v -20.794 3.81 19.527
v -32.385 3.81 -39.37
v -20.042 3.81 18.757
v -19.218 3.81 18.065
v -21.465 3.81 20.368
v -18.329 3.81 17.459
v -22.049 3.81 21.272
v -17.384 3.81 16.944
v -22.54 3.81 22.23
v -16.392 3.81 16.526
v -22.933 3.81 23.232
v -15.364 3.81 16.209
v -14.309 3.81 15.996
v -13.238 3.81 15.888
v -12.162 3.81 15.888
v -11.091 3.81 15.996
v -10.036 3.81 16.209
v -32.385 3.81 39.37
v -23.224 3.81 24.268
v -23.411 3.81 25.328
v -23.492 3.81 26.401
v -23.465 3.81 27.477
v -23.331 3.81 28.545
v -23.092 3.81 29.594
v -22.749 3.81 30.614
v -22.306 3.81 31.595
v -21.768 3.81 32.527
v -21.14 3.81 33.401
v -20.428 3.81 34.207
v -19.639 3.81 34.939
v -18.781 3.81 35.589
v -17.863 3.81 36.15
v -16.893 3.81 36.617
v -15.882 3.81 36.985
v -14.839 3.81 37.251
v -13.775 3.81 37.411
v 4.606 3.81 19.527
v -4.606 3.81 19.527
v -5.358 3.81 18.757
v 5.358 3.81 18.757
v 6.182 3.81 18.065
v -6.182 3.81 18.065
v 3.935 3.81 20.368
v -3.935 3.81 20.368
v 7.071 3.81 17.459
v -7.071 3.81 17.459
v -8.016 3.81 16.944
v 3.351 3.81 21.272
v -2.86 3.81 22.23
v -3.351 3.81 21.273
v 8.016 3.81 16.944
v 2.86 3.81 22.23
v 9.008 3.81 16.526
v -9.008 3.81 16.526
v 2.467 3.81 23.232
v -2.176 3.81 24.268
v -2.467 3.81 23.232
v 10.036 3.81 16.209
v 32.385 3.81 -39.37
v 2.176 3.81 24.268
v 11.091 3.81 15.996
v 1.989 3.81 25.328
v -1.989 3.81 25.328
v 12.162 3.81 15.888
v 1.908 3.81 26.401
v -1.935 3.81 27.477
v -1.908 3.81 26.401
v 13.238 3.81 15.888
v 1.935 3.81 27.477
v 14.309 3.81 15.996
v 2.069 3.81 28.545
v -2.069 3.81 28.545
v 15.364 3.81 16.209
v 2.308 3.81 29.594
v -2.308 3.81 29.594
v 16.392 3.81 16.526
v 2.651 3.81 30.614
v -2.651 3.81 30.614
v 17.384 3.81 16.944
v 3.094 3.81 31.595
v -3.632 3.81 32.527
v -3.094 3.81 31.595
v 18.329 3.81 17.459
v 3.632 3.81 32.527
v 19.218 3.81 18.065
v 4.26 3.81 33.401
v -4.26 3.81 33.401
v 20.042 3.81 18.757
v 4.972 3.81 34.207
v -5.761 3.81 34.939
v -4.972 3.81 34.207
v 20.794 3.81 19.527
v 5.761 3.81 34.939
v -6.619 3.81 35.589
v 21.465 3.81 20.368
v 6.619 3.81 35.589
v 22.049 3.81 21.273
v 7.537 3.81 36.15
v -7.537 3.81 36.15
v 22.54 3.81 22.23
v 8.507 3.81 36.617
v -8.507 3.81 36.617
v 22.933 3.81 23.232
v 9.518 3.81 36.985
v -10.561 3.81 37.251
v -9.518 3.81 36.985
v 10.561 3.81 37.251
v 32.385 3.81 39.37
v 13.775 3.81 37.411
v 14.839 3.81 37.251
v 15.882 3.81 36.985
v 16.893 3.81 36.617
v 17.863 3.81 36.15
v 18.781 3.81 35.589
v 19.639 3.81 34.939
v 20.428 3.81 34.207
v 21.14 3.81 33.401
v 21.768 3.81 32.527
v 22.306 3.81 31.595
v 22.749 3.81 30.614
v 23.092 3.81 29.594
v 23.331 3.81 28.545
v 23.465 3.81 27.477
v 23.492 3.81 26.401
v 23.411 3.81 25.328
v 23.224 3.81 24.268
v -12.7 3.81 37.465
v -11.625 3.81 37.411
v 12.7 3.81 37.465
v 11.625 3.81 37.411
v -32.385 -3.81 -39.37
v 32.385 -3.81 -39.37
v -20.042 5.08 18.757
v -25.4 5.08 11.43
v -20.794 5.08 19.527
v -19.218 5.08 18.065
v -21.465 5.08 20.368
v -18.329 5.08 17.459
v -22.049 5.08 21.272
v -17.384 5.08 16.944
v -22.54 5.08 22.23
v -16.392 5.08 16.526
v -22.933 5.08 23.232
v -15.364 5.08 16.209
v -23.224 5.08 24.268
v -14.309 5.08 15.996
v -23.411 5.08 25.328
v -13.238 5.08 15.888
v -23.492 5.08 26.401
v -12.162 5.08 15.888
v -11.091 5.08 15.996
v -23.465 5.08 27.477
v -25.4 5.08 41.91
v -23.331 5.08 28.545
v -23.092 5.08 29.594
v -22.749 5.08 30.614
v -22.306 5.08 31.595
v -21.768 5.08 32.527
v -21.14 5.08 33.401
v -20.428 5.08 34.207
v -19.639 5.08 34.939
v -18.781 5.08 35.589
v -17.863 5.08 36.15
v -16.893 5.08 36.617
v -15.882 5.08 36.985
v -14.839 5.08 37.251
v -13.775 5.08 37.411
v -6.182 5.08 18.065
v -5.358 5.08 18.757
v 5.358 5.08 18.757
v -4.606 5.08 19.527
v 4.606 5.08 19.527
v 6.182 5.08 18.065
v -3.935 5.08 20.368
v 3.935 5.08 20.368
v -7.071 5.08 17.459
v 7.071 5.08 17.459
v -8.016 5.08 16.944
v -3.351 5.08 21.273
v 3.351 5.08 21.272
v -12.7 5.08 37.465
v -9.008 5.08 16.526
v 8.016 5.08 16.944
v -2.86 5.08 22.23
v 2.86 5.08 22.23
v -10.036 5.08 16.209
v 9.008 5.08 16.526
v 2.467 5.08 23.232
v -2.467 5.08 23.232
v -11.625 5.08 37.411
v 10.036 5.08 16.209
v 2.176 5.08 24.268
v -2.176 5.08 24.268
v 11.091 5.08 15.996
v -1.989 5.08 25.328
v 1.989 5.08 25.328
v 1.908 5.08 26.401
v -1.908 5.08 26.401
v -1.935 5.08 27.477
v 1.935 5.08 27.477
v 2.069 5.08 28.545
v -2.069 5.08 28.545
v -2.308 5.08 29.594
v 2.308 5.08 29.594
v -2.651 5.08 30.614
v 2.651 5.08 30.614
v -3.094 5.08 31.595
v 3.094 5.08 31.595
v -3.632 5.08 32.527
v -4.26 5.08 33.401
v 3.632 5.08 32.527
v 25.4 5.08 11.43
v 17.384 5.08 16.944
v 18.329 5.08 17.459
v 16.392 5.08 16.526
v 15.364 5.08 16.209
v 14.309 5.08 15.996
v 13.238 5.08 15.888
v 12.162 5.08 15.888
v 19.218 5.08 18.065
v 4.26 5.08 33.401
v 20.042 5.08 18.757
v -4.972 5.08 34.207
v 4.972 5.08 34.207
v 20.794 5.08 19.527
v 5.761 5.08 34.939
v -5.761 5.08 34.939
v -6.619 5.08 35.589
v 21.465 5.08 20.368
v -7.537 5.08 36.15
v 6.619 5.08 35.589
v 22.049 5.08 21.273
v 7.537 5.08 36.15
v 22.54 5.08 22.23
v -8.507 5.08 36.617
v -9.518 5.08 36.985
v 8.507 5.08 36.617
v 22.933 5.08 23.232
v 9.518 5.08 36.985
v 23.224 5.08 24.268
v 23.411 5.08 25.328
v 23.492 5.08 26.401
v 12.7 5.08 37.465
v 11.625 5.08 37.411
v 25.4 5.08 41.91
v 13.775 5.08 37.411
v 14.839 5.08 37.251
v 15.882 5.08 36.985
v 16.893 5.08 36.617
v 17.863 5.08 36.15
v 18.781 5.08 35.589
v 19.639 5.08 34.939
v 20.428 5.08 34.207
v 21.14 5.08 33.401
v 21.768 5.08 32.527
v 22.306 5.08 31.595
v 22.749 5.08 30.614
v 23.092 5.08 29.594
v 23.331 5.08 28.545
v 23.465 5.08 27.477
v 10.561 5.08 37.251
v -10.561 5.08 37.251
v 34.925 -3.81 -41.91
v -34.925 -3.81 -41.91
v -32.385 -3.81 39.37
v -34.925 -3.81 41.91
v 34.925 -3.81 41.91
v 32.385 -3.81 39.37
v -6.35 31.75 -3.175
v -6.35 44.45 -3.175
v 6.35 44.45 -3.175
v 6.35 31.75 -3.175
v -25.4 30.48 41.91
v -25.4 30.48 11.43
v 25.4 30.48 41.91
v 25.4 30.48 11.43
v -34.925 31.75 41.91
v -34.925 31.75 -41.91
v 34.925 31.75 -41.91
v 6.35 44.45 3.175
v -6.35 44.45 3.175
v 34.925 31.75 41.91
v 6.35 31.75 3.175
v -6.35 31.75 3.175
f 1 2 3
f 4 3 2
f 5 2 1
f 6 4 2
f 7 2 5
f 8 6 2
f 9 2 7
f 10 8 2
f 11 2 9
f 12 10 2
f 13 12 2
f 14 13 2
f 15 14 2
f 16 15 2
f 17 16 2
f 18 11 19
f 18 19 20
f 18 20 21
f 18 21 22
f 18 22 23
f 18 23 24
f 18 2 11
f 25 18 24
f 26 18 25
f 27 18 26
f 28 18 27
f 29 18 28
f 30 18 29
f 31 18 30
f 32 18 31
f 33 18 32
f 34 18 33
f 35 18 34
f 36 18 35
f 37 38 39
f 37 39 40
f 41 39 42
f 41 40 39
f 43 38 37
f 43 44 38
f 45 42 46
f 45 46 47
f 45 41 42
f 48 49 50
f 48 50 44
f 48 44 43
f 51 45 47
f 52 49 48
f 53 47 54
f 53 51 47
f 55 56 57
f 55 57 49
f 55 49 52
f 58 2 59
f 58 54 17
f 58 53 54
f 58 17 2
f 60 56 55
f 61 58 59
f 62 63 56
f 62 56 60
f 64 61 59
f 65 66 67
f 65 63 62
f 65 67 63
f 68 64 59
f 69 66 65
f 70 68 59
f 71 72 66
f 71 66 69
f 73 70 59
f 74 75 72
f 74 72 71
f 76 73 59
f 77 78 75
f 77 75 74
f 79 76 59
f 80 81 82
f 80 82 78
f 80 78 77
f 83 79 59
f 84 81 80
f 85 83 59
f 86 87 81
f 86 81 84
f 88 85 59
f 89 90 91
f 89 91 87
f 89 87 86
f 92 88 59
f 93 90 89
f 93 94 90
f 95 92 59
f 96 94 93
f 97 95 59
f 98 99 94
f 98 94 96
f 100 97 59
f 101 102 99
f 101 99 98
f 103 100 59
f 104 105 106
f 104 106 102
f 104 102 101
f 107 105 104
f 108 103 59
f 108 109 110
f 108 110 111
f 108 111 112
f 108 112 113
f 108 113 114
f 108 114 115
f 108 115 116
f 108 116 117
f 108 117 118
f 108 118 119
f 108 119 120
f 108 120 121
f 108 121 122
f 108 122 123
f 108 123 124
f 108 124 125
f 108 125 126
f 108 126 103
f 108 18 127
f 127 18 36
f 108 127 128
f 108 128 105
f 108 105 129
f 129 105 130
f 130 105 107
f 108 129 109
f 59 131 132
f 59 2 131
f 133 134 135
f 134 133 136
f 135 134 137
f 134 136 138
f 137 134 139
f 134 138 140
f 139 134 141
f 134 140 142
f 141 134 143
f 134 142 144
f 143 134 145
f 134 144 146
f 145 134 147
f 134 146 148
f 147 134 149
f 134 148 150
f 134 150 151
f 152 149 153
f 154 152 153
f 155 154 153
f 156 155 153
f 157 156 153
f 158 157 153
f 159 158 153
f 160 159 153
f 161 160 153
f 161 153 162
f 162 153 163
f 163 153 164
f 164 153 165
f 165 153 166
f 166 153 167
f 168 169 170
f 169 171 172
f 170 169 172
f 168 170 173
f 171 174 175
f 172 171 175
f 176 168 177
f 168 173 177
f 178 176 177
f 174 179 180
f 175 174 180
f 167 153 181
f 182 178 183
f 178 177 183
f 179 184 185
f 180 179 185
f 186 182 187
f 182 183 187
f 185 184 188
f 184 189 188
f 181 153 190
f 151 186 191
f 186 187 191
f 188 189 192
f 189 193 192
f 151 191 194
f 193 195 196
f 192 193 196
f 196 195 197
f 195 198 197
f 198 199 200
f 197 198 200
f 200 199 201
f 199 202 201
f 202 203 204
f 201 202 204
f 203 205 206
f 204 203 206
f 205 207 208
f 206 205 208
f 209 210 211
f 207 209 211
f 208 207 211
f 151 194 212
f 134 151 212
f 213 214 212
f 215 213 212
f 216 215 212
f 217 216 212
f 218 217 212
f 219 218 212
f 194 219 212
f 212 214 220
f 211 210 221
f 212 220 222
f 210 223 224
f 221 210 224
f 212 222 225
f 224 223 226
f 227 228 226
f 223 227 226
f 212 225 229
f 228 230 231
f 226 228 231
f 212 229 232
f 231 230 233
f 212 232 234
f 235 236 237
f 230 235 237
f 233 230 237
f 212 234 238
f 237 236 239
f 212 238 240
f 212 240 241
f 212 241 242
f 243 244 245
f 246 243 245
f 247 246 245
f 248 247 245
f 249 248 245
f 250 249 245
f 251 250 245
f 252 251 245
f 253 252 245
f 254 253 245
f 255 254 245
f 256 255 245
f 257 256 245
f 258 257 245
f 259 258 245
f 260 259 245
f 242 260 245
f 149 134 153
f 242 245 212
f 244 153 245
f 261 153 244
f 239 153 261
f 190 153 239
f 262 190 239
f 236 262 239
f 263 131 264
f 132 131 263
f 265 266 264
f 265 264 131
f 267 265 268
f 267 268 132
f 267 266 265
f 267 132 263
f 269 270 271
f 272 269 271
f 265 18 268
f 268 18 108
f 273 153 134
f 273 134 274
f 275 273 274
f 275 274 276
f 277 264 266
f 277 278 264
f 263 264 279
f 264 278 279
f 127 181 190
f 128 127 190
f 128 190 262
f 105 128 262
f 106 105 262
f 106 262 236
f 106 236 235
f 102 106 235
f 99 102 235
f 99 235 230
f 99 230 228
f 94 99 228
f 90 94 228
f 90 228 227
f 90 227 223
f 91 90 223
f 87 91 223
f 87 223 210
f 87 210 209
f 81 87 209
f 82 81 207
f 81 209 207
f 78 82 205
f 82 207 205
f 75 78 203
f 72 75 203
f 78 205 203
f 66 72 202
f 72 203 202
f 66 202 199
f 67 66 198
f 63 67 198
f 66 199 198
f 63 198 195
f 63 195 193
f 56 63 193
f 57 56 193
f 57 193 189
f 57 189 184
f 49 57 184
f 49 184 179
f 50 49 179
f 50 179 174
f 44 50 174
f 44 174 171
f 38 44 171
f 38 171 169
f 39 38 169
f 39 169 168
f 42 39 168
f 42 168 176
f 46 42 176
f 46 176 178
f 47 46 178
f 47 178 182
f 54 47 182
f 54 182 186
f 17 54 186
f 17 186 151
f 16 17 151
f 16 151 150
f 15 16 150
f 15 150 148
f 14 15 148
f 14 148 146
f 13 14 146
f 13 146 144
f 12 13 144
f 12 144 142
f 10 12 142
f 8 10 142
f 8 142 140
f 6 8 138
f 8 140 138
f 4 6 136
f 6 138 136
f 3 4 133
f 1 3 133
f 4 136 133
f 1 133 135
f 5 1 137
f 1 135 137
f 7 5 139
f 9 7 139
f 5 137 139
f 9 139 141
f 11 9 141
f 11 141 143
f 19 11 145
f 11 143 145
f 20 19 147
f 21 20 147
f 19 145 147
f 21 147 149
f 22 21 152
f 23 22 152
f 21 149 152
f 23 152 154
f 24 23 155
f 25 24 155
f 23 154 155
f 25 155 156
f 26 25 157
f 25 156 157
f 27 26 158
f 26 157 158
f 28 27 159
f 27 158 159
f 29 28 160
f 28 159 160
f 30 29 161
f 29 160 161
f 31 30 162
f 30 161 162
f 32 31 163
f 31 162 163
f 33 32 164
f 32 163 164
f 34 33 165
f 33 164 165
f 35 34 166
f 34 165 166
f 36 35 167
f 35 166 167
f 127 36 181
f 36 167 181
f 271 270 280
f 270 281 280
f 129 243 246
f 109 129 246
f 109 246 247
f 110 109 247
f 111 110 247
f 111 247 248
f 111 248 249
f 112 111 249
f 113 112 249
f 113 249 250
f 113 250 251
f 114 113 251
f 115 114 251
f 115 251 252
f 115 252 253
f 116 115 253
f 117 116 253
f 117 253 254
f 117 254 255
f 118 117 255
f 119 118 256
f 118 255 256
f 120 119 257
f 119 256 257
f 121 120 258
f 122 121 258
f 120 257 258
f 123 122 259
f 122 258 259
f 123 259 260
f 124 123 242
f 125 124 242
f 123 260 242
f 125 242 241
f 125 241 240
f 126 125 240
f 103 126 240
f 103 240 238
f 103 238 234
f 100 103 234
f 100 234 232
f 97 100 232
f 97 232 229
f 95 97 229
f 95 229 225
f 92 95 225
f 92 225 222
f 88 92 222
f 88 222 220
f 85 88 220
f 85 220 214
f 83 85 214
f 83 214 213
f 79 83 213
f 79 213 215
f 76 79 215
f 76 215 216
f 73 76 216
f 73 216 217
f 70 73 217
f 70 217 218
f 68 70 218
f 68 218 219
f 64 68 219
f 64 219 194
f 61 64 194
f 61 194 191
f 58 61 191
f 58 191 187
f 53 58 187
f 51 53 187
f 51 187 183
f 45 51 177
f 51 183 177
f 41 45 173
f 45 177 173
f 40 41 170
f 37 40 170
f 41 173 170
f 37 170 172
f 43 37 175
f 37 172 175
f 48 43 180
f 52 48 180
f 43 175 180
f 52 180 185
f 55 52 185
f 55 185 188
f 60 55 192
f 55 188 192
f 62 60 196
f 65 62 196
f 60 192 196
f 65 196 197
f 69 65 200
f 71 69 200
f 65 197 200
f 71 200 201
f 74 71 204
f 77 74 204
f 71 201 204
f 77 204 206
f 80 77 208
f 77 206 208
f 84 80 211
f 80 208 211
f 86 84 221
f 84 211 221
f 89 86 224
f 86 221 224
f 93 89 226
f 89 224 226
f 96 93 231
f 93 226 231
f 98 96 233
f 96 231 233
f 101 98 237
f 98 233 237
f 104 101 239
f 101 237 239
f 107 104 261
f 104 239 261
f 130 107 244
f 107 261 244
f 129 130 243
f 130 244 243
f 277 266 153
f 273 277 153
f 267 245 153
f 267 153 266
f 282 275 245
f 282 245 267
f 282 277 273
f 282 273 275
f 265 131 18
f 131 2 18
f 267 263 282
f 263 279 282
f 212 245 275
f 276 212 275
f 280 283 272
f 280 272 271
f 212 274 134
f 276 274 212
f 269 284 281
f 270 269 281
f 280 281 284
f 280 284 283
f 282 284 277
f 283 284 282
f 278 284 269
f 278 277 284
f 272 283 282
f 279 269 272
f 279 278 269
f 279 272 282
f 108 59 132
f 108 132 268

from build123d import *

# Parameters (mm, degrees)
SKETCH1_W           = 69.85
SKETCH1_H           = 6.35
BOSS_EXTRUDE1_DEPTH = 41.91
SHELL1_T            = -2.54
SKETCH2_W           = 69.85
SKETCH2_H           = 83.82
BOSS_EXTRUDE2_DEPTH = 25.4
SKETCH5_W           = 12.7
SKETCH5_H           = 12.7
BOSS_EXTRUDE5_DEPTH = 3.175
SKETCH6_W           = 50.8
SKETCH6_H           = 25.4
CUT_EXTRUDE1_DEPTH  = 30.48
CUT_EXTRUDE2_REACH  = 69.277
SKETCH7_R           = 10.795
SKETCH8_W           = 69.85
SKETCH8_H           = 83.82
SKETCH8_W_2         = 64.77
SKETCH8_H_2         = 78.74
BOSS_EXTRUDE6_DEPTH = 3.81


with BuildPart() as part:
    # Sketch1 → Boss-Extrude1 (new, symmetric)
    with BuildSketch(Plane.XY):
        with Locations((0, 3.175)):
            Rectangle(SKETCH1_W, SKETCH1_H)
    extrude(amount=BOSS_EXTRUDE1_DEPTH, both=True)

    # Shell1
    shell1_openings = [part.faces().sort_by_distance(p)[0] for p in [
        (0, 0, 0),
    ]]
    offset(amount=SHELL1_T, openings=shell1_openings, kind=Kind.INTERSECTION)

    # Sketch2 → Boss-Extrude2 (add)
    with BuildSketch(Plane(origin=(0, 6.35, 0), x_dir=(1, 0, 0), z_dir=(0, 1, 0))):
        Rectangle(SKETCH2_W, SKETCH2_H)
    extrude(amount=BOSS_EXTRUDE2_DEPTH)

    # Sketch5 → Boss-Extrude5 (add, symmetric)
    with BuildSketch(Plane.XY):
        with Locations((0, 38.1)):
            Rectangle(SKETCH5_W, SKETCH5_H)
    extrude(amount=BOSS_EXTRUDE5_DEPTH, both=True)

    # Sketch6 → Cut-Extrude1 (cut)
    with BuildSketch(Plane.XY.offset(41.91)):
        with Locations((0, 17.78)):
            Rectangle(SKETCH6_W, SKETCH6_H)
    extrude(amount=-CUT_EXTRUDE1_DEPTH, mode=Mode.SUBTRACT)

    # Sketch7 → Cut-Extrude2 (cut, up to next)
    with BuildSketch(Plane(origin=(0, 5.08, 0), x_dir=(1, 0, 0), z_dir=(0, 1, 0)), mode=Mode.PRIVATE) as cut_extrude2_sk1:
        with Locations(Location((-12.7, -26.67, 0), (0, 0, 270))):
            Circle(SKETCH7_R)
    cut_extrude2_tool1 = extrude(cut_extrude2_sk1.sketch, amount=-CUT_EXTRUDE2_REACH, mode=Mode.PRIVATE) & part.part
    # Sketch7 → Cut-Extrude2 (cut, up to next)
    with BuildSketch(Plane(origin=(0, 5.08, 0), x_dir=(1, 0, 0), z_dir=(0, 1, 0)), mode=Mode.PRIVATE) as cut_extrude2_sk2:
        with Locations(Location((12.7, -26.67, 0), (0, 0, 270))):
            Circle(SKETCH7_R)
    cut_extrude2_tool2 = extrude(cut_extrude2_sk2.sketch, amount=-CUT_EXTRUDE2_REACH, mode=Mode.PRIVATE) & part.part
    add(cut_extrude2_tool1.solids().sort_by_distance((-12.7, 5.08, 26.67))[0], mode=Mode.SUBTRACT)
    add(cut_extrude2_tool2.solids().sort_by_distance((12.7, 5.08, 26.67))[0], mode=Mode.SUBTRACT)

    # Sketch8 → Boss-Extrude6 (add)
    with BuildSketch(Plane.XZ):
        Rectangle(SKETCH8_W, SKETCH8_H)
        Rectangle(SKETCH8_W_2, SKETCH8_H_2, mode=Mode.SUBTRACT)
    extrude(amount=BOSS_EXTRUDE6_DEPTH)


solid = part.part
